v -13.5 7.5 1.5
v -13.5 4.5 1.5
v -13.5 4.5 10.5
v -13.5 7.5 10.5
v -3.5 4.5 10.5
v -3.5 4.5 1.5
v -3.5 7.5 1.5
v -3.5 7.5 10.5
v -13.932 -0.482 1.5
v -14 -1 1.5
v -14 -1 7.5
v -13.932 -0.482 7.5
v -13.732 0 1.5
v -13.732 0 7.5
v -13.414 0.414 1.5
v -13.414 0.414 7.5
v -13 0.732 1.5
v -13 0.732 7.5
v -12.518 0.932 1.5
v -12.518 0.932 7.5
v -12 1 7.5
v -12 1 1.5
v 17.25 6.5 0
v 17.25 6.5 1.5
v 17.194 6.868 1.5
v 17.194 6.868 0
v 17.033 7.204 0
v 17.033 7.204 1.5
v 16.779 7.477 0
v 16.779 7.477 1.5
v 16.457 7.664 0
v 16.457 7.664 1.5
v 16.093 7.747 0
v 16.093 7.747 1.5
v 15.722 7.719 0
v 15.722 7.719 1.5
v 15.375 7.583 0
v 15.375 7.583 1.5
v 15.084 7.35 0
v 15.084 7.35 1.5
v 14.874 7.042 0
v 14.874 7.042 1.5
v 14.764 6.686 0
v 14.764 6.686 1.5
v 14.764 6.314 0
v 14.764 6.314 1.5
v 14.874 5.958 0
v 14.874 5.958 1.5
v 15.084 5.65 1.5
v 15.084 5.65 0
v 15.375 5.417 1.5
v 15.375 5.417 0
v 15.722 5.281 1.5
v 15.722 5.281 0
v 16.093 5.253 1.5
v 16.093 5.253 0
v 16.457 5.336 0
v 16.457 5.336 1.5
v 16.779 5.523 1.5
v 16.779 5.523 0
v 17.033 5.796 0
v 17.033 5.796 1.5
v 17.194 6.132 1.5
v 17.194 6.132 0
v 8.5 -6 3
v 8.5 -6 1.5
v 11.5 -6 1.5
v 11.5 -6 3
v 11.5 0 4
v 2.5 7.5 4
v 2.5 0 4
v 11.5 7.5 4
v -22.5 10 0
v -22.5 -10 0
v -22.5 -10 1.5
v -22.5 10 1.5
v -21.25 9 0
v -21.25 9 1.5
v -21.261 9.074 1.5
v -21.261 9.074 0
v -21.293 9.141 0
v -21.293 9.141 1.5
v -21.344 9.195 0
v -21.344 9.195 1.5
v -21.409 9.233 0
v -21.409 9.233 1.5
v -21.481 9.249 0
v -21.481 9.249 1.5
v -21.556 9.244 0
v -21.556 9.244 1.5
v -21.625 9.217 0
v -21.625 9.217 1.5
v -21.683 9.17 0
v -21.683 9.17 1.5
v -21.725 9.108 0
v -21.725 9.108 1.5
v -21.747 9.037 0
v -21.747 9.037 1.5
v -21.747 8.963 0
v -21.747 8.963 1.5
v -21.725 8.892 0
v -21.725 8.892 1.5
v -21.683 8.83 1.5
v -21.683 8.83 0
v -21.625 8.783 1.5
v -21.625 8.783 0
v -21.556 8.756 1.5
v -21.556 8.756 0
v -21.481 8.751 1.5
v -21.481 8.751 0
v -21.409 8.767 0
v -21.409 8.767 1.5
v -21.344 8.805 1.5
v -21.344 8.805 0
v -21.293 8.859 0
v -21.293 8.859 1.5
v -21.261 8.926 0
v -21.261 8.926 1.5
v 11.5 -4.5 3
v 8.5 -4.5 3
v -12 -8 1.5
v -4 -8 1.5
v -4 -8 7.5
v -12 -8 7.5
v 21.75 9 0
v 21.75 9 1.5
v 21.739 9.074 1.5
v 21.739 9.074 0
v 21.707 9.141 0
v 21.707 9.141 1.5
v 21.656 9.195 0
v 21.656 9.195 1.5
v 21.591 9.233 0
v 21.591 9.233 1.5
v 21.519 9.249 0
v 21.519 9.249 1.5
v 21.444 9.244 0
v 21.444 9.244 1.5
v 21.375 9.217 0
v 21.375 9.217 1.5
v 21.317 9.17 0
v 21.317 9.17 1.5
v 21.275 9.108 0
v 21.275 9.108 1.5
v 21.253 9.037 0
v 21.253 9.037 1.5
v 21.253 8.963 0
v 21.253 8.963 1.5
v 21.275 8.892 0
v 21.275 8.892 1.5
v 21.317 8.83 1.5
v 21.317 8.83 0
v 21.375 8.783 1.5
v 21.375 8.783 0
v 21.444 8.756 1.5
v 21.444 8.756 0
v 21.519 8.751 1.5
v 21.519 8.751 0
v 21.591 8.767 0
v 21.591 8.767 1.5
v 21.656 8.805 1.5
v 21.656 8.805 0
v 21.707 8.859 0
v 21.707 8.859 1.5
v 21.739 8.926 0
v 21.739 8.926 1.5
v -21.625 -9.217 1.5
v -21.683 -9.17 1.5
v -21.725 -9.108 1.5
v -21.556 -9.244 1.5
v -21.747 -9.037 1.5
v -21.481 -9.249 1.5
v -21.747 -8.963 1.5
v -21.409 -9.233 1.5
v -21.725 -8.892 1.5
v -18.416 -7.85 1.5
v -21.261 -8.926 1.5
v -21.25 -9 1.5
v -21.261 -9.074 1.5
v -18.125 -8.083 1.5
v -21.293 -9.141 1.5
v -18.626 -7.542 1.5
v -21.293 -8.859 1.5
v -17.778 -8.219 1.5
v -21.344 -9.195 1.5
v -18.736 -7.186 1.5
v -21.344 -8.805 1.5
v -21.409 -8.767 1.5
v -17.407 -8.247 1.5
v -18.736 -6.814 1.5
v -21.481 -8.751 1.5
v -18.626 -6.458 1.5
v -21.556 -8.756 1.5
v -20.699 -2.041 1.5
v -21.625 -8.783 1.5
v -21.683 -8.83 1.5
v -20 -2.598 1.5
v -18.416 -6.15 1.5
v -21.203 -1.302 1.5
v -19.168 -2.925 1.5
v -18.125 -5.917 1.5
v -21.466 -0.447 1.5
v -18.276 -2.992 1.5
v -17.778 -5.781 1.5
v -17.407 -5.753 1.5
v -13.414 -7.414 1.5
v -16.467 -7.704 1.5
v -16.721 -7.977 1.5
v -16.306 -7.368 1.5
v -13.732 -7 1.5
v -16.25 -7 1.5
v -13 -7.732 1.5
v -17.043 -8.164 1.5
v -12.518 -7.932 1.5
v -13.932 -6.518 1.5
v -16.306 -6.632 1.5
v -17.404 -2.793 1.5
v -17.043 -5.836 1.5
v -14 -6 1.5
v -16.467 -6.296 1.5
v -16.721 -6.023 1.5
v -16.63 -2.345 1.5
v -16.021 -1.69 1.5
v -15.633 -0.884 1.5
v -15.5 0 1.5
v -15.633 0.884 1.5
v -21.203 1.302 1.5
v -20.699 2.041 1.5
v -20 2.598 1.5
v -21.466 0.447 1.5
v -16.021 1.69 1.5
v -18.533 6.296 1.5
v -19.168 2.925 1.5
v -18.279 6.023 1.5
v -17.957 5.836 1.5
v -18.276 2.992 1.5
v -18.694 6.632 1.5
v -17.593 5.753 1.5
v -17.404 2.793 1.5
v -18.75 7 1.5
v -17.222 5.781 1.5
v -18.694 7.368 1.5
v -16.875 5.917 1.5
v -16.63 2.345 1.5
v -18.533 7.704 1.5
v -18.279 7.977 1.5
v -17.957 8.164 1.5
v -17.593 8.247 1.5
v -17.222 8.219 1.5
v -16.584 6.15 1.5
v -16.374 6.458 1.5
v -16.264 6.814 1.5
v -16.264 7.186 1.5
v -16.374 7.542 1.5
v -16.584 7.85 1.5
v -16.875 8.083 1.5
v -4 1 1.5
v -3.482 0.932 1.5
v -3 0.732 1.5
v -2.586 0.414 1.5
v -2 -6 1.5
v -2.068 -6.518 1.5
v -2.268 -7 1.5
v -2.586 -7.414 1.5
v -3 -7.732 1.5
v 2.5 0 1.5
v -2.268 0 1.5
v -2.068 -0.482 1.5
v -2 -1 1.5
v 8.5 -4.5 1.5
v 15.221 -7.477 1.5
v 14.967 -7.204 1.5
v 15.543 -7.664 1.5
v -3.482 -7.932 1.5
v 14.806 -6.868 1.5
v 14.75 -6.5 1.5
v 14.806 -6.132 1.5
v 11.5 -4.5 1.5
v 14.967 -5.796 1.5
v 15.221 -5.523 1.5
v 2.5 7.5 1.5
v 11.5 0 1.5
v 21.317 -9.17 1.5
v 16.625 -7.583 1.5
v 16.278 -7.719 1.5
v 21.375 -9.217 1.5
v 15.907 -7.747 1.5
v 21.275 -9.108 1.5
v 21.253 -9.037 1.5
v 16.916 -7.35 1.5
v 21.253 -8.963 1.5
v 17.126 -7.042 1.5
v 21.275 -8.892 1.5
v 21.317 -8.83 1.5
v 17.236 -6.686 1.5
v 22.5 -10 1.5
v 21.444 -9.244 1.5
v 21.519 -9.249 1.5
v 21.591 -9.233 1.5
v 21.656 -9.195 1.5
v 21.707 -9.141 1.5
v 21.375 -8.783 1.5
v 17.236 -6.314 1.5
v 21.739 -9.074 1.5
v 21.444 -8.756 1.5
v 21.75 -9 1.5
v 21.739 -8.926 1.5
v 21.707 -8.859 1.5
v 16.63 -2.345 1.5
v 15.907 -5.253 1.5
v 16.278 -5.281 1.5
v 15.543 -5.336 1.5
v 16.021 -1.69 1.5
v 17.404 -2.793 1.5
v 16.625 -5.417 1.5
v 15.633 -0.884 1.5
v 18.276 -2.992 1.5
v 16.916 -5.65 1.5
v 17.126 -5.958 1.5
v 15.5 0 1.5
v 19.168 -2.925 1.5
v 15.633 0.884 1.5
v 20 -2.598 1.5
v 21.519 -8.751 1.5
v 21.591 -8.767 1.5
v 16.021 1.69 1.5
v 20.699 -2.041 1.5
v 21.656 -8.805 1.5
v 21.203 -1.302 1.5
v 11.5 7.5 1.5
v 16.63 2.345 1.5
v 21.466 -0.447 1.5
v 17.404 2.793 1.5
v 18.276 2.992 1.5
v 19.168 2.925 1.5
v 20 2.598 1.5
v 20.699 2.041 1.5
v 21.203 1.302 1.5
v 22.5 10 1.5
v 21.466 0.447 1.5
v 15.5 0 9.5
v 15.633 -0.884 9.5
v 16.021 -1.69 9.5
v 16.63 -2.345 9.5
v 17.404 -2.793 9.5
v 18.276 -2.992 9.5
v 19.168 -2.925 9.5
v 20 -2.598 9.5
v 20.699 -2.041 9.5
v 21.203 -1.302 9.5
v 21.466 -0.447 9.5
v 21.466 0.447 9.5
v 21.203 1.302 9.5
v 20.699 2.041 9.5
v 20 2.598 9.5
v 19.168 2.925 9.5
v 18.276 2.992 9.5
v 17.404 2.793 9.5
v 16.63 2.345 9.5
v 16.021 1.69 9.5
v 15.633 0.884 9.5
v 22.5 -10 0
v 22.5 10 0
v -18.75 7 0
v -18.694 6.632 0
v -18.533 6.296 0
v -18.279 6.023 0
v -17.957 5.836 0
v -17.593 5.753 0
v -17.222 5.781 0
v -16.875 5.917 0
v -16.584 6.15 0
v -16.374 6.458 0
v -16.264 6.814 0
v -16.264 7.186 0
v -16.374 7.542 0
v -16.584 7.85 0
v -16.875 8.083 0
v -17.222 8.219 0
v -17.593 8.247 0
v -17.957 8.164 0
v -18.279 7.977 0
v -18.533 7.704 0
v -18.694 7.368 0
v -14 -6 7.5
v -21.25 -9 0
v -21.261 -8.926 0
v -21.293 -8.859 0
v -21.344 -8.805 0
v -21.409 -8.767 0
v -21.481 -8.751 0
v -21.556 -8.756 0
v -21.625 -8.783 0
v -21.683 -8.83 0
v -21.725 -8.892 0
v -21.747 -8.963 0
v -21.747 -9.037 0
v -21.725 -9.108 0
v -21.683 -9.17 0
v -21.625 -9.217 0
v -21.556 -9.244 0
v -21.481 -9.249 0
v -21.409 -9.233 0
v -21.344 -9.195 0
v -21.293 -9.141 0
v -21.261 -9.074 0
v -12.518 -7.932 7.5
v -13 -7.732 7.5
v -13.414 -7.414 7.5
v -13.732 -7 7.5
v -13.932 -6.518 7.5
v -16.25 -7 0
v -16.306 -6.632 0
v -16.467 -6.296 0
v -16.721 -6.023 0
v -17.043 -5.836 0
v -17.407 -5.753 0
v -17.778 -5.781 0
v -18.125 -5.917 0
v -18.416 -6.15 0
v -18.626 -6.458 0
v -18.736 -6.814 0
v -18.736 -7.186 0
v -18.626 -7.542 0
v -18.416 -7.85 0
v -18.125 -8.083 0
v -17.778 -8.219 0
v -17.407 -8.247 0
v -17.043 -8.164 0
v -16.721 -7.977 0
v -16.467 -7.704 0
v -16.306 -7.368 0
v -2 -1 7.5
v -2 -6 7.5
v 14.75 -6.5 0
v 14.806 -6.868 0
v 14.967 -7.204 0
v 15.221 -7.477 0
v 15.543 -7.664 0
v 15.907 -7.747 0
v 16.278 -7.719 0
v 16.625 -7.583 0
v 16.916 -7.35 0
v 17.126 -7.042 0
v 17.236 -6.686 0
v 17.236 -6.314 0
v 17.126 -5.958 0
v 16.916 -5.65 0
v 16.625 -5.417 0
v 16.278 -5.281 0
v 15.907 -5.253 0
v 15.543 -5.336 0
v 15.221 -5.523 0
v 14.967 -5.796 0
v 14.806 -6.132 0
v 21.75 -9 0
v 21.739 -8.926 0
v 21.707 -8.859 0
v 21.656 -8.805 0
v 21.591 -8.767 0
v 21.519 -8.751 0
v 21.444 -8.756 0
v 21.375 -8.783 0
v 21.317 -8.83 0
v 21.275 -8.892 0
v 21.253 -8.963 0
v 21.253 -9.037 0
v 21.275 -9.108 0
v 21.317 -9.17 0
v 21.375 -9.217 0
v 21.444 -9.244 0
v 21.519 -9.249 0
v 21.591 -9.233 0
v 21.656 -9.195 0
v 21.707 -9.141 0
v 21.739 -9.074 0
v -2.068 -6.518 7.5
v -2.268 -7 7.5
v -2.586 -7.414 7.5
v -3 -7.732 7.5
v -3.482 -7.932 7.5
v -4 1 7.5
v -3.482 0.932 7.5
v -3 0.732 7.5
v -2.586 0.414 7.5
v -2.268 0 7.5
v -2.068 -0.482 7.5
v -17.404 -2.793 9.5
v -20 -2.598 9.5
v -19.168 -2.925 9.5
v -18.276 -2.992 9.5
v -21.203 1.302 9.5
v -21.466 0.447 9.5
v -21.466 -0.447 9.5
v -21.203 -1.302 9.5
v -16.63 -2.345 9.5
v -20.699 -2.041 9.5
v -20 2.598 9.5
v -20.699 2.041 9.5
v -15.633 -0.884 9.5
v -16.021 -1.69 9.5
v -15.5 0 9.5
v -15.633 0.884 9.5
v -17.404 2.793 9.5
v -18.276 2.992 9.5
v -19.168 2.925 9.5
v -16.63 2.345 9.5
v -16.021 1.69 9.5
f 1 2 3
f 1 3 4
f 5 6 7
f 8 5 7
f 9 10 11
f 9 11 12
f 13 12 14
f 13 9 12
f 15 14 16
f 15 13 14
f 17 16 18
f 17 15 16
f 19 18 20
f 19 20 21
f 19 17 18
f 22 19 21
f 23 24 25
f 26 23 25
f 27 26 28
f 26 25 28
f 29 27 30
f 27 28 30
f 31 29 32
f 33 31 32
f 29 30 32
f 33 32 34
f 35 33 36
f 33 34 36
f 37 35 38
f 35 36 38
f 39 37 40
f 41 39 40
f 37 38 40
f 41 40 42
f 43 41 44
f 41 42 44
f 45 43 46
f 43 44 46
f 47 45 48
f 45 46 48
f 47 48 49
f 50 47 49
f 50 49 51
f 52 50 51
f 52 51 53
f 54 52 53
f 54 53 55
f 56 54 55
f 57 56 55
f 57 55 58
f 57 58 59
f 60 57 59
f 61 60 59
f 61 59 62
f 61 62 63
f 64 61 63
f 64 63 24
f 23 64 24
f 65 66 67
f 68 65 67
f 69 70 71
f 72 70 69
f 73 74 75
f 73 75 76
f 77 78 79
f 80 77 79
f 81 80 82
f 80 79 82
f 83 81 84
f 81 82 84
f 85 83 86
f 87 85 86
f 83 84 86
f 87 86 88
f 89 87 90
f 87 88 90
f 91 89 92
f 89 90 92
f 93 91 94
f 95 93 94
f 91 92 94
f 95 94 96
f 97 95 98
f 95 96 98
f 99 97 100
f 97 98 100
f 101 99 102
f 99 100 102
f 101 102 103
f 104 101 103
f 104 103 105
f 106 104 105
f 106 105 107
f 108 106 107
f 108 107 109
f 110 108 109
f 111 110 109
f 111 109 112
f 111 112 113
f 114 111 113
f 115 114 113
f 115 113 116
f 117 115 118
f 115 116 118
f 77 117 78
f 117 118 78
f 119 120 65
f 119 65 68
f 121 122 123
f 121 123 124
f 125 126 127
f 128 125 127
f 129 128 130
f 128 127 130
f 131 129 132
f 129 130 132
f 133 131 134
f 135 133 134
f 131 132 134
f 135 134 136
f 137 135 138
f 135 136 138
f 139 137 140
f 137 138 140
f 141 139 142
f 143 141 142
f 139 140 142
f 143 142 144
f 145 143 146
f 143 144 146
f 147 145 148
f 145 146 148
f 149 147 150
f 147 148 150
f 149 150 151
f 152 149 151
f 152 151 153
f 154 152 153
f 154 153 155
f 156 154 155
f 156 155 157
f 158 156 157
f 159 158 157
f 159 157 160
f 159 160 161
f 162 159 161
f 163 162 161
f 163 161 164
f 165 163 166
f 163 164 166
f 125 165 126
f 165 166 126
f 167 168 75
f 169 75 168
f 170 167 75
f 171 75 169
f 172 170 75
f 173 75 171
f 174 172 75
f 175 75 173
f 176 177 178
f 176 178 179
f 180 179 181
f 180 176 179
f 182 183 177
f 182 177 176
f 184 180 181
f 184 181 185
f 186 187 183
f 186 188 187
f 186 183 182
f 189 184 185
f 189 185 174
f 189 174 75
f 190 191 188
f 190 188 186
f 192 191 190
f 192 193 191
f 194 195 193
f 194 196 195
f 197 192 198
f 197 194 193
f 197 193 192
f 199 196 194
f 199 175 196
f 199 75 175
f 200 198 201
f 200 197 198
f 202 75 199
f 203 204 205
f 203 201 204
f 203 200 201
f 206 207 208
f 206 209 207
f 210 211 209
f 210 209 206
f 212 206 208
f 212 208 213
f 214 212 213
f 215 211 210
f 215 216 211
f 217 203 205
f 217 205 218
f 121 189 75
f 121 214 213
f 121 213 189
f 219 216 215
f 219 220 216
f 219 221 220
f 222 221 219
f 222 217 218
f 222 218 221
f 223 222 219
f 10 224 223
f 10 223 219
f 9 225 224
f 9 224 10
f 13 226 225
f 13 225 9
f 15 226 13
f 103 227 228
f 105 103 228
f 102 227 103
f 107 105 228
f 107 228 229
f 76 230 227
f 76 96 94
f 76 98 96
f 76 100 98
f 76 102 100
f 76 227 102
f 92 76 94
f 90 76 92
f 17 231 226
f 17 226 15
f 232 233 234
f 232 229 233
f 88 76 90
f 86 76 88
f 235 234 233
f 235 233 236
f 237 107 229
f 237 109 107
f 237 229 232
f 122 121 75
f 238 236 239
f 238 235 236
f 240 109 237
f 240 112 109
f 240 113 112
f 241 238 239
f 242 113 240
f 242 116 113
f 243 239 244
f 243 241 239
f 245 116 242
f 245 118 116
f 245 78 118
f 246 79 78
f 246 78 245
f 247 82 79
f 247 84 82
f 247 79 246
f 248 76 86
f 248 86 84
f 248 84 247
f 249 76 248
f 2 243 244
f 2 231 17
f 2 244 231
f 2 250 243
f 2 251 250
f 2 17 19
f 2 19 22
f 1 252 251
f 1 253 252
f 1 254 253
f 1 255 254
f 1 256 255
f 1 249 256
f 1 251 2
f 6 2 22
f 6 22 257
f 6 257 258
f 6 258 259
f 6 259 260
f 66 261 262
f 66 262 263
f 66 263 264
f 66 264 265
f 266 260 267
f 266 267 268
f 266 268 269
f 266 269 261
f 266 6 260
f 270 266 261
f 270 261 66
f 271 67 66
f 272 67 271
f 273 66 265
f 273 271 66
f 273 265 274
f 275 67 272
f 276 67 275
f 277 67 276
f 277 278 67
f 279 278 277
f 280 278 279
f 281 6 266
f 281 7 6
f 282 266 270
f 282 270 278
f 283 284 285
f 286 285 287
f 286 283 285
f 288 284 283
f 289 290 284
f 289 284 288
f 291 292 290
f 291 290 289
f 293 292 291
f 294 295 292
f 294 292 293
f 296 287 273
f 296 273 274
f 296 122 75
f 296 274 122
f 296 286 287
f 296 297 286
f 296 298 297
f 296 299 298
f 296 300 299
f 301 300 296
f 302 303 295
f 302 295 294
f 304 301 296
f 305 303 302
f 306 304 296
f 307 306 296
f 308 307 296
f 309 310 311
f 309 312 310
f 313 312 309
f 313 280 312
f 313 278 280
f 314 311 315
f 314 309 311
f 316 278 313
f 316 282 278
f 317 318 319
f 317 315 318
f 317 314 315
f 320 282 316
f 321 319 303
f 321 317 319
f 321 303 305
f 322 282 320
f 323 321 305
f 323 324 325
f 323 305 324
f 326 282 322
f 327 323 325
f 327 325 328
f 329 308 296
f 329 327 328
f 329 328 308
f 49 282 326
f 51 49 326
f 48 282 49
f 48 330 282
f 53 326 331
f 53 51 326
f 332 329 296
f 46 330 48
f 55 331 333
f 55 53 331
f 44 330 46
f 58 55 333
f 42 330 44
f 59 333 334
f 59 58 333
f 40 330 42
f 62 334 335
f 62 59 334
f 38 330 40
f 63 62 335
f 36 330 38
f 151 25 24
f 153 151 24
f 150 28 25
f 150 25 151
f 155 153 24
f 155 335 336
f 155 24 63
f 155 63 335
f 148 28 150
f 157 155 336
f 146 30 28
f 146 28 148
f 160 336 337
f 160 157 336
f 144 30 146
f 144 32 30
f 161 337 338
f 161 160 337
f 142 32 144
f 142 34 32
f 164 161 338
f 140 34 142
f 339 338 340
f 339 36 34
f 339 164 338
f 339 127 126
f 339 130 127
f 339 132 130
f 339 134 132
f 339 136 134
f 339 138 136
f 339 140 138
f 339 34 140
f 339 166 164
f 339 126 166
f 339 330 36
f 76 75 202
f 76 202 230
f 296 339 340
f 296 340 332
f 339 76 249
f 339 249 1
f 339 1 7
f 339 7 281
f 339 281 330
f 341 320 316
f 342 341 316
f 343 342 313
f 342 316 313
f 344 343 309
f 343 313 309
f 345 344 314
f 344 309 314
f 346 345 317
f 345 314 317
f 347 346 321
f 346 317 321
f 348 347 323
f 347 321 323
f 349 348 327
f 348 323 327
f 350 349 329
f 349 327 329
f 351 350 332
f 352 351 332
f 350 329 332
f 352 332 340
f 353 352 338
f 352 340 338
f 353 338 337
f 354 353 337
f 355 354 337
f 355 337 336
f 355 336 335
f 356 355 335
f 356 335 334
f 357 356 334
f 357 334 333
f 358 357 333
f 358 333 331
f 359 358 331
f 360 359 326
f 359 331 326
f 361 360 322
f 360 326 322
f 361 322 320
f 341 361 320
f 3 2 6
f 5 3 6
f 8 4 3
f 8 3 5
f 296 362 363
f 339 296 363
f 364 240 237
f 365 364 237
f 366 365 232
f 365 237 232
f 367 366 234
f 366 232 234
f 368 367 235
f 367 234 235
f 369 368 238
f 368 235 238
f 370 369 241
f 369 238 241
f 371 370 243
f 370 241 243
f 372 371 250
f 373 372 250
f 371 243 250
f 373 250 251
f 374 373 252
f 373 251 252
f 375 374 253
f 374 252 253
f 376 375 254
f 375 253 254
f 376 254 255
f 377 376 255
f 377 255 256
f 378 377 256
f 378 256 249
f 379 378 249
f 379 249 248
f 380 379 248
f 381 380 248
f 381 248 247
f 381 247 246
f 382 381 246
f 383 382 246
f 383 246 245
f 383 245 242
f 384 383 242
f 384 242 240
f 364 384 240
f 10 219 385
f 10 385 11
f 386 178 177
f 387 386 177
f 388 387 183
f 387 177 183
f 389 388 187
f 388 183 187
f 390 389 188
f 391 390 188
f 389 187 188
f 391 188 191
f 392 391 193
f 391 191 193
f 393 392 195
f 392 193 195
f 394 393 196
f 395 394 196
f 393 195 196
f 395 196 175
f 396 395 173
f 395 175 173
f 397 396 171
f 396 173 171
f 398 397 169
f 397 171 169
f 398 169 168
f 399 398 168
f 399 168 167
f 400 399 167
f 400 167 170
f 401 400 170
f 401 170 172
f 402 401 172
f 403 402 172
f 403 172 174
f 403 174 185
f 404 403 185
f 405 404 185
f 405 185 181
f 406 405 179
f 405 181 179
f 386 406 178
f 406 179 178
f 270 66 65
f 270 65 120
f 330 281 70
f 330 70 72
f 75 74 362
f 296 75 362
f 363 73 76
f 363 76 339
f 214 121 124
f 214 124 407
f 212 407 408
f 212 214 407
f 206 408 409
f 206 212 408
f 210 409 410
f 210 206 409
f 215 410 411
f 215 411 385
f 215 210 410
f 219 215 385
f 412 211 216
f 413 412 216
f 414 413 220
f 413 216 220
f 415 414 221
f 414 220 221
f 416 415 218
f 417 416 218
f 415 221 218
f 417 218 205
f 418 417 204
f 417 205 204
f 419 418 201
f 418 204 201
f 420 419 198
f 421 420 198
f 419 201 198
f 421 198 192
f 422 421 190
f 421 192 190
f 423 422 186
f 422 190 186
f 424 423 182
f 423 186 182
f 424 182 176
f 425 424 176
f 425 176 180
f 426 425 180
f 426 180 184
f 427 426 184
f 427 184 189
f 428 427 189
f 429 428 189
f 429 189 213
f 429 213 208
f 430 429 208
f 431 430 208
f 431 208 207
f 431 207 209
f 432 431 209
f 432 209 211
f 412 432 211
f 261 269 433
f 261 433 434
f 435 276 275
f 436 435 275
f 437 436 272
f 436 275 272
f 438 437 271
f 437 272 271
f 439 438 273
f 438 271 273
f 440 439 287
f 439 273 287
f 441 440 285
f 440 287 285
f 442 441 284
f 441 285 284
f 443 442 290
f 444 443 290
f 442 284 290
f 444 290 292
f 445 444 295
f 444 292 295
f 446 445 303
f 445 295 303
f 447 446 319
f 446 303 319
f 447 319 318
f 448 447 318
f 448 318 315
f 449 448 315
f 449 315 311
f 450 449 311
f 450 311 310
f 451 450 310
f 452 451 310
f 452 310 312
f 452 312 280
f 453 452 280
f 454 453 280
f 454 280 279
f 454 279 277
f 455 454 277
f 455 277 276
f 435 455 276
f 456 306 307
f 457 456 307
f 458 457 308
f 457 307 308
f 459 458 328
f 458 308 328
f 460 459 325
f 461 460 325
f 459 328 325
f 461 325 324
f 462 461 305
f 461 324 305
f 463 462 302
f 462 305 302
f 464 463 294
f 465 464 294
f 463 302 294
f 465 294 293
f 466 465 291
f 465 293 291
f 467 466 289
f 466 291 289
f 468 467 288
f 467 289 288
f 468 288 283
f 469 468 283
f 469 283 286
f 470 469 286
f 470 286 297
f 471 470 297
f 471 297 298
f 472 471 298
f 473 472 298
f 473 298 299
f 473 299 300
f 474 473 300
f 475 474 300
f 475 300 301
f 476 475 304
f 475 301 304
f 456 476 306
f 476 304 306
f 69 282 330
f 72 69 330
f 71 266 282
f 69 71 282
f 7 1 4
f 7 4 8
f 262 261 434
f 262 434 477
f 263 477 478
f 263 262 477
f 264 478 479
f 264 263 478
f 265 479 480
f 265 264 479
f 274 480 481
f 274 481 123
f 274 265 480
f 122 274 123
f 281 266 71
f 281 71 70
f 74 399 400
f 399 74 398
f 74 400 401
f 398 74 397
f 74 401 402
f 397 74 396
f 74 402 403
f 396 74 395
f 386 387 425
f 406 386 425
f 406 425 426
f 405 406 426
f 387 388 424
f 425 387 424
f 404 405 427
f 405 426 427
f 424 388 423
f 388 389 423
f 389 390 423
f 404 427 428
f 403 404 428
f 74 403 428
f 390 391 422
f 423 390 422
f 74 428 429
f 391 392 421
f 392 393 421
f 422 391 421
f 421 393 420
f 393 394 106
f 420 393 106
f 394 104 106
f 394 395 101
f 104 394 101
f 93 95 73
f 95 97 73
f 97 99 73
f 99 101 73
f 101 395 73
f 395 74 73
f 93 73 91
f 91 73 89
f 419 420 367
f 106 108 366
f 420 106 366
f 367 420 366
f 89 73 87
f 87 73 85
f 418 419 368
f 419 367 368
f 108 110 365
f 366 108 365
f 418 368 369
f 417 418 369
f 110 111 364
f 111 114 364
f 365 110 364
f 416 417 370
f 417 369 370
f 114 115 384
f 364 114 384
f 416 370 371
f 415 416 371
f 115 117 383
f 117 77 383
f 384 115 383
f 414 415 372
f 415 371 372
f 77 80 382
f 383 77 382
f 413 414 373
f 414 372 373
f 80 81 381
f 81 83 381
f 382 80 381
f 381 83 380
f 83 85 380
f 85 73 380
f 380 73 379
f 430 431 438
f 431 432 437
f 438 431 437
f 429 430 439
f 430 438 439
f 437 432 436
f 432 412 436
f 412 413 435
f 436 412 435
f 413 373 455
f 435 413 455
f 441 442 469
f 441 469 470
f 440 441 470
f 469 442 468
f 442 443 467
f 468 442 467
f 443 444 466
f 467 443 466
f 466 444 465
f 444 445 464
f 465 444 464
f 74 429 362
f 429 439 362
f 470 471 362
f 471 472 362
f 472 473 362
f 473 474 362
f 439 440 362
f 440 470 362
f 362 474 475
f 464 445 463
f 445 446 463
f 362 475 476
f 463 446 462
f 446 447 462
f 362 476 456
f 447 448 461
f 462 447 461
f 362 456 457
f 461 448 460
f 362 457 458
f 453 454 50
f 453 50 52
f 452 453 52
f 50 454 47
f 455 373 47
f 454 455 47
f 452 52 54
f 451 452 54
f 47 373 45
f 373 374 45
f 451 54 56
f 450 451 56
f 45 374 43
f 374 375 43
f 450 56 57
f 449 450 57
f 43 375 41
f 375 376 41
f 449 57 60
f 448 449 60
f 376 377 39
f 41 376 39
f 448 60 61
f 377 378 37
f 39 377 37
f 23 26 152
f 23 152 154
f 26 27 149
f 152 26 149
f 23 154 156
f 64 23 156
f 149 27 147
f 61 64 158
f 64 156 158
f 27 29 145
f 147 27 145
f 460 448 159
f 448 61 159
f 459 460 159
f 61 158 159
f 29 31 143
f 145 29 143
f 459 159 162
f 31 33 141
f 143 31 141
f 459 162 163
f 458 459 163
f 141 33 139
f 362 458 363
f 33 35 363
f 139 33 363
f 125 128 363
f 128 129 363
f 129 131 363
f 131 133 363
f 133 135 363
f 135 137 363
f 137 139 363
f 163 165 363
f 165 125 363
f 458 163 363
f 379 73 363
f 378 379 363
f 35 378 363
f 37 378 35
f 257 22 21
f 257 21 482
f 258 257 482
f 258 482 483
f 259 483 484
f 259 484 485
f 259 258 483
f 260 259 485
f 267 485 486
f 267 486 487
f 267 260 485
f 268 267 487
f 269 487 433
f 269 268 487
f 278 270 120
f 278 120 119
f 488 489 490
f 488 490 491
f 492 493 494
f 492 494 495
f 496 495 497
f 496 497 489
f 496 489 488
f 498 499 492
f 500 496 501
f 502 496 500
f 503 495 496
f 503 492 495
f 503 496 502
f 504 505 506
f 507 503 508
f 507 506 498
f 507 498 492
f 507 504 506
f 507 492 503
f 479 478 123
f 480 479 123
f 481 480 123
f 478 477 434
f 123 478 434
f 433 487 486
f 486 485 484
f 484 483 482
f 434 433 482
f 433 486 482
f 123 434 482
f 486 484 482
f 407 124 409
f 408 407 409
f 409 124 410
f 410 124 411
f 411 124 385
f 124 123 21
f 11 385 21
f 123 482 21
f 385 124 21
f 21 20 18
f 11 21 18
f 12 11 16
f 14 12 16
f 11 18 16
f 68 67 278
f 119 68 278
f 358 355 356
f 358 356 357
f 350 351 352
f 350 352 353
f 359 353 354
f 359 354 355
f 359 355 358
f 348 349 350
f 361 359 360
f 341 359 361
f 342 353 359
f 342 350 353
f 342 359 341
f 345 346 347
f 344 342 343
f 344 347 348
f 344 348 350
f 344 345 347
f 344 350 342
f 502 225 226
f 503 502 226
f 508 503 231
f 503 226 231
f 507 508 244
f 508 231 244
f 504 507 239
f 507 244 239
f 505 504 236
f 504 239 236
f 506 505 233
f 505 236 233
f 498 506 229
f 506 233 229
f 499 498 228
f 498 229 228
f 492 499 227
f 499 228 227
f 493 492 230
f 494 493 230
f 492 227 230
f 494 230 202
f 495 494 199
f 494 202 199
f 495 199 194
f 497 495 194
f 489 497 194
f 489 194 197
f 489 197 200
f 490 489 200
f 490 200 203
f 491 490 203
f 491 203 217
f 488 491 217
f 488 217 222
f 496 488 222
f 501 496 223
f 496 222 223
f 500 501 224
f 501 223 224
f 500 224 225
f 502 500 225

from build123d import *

# Parameters (mm, degrees)
SKETCH1_W           = 45
SKETCH1_H           = 20
BOSS_EXTRUDE1_DEPTH = 1.5
SKETCH2_R           = 3
BOSS_EXTRUDE3_DEPTH = 8
SKETCH3_W           = 10
SKETCH3_H           = 3
BOSS_EXTRUDE4_DEPTH = 9
BOSS_EXTRUDE5_DEPTH = 6
SKETCH6_W           = 9
SKETCH6_H           = 7.5
BOSS_EXTRUDE6_DEPTH = 2.5
SKETCH7_W           = 3
SKETCH7_H           = 1.5
BOSS_EXTRUDE7_DEPTH = 1.5
SKETCH9_R           = 1.25
CUT_EXTRUDE1_DEPTH  = 27.215453458
SKETCH10_R          = 1.25
CUT_EXTRUDE2_DEPTH  = 27.215453458
SKETCH12_R          = 0.25
CUT_EXTRUDE3_DEPTH  = 1.5


with BuildPart() as part:
    # Sketch1 → Boss-Extrude1 (new body)
    with BuildSketch(Plane.XY):
        Rectangle(SKETCH1_W, SKETCH1_H)
    extrude(amount=BOSS_EXTRUDE1_DEPTH)

    # Sketch2 → Boss-Extrude3 (add)
    with BuildSketch(Plane.XY.offset(1.5)):
        with Locations((-18.5, 0)):
            Circle(SKETCH2_R)
        with Locations(Location((18.5, 0, 0), (0, 0, 180))):
            Circle(SKETCH2_R)
    extrude(amount=BOSS_EXTRUDE3_DEPTH)

    # Sketch3 → Boss-Extrude4 (add)
    with BuildSketch(Plane.XY.offset(1.5)):
        with Locations((-8.5, 6)):
            Rectangle(SKETCH3_W, SKETCH3_H)
    extrude(amount=BOSS_EXTRUDE4_DEPTH)

    # Sketch5 → Boss-Extrude5 (add)
    with BuildSketch(Plane.XY.offset(1.5)):
        with BuildLine():
            Line((-12, 1), (-4, 1))
            ThreePointArc((-4, 1), (-2.585786438, 0.414213562), (-2, -1))
            Line((-2, -1), (-2, -6))
            ThreePointArc((-2, -6), (-2.585786438, -7.414213562), (-4, -8))
            Line((-4, -8), (-12, -8))
            ThreePointArc((-12, -8), (-13.414213562, -7.414213562), (-14, -6))
            Line((-14, -6), (-14, -1))
            ThreePointArc((-14, -1), (-13.414213562, 0.414213562), (-12, 1))
        make_face()
    extrude(amount=BOSS_EXTRUDE5_DEPTH)

    # Sketch6 → Boss-Extrude6 (add)
    with BuildSketch(Plane.XY.offset(1.5)):
        with Locations((7, 3.75)):
            Rectangle(SKETCH6_W, SKETCH6_H)
    extrude(amount=BOSS_EXTRUDE6_DEPTH)

    # Sketch7 → Boss-Extrude7 (add)
    with BuildSketch(Plane.XY.offset(1.5)):
        with Locations((10, -5.25)):
            Rectangle(SKETCH7_W, SKETCH7_H)
    extrude(amount=BOSS_EXTRUDE7_DEPTH)

    # Sketch9 → Cut-Extrude1 (cut, through all)
    with BuildSketch(Plane.XY.offset(1.5)):
        with Locations((-17.5, -7)):
            Circle(SKETCH9_R)
        with Locations(Location((-17.5, 7, 0), (0, 0, 180))):
            Circle(SKETCH9_R)
    extrude(amount=-CUT_EXTRUDE1_DEPTH, mode=Mode.SUBTRACT)

    # Sketch10 → Cut-Extrude2 (cut, through all)
    with BuildSketch(Plane.XY.offset(1.5)):
        with Locations((16, 6.5)):
            Circle(SKETCH10_R)
        with Locations(Location((16, -6.5, 0), (0, 0, 180))):
            Circle(SKETCH10_R)
    extrude(amount=-CUT_EXTRUDE2_DEPTH, mode=Mode.SUBTRACT)

    # Sketch12 → Cut-Extrude3 (cut)
    with BuildSketch(Plane.XY.offset(1.5)):
        with Locations((-21.5, 9)):
            Circle(SKETCH12_R)
        with Locations((21.5, 9)):
            Circle(SKETCH12_R)
        with Locations((21.5, -9)):
            Circle(SKETCH12_R)
        with Locations((-21.5, -9)):
            Circle(SKETCH12_R)
    extrude(amount=-CUT_EXTRUDE3_DEPTH, mode=Mode.SUBTRACT)


solid = part.part
